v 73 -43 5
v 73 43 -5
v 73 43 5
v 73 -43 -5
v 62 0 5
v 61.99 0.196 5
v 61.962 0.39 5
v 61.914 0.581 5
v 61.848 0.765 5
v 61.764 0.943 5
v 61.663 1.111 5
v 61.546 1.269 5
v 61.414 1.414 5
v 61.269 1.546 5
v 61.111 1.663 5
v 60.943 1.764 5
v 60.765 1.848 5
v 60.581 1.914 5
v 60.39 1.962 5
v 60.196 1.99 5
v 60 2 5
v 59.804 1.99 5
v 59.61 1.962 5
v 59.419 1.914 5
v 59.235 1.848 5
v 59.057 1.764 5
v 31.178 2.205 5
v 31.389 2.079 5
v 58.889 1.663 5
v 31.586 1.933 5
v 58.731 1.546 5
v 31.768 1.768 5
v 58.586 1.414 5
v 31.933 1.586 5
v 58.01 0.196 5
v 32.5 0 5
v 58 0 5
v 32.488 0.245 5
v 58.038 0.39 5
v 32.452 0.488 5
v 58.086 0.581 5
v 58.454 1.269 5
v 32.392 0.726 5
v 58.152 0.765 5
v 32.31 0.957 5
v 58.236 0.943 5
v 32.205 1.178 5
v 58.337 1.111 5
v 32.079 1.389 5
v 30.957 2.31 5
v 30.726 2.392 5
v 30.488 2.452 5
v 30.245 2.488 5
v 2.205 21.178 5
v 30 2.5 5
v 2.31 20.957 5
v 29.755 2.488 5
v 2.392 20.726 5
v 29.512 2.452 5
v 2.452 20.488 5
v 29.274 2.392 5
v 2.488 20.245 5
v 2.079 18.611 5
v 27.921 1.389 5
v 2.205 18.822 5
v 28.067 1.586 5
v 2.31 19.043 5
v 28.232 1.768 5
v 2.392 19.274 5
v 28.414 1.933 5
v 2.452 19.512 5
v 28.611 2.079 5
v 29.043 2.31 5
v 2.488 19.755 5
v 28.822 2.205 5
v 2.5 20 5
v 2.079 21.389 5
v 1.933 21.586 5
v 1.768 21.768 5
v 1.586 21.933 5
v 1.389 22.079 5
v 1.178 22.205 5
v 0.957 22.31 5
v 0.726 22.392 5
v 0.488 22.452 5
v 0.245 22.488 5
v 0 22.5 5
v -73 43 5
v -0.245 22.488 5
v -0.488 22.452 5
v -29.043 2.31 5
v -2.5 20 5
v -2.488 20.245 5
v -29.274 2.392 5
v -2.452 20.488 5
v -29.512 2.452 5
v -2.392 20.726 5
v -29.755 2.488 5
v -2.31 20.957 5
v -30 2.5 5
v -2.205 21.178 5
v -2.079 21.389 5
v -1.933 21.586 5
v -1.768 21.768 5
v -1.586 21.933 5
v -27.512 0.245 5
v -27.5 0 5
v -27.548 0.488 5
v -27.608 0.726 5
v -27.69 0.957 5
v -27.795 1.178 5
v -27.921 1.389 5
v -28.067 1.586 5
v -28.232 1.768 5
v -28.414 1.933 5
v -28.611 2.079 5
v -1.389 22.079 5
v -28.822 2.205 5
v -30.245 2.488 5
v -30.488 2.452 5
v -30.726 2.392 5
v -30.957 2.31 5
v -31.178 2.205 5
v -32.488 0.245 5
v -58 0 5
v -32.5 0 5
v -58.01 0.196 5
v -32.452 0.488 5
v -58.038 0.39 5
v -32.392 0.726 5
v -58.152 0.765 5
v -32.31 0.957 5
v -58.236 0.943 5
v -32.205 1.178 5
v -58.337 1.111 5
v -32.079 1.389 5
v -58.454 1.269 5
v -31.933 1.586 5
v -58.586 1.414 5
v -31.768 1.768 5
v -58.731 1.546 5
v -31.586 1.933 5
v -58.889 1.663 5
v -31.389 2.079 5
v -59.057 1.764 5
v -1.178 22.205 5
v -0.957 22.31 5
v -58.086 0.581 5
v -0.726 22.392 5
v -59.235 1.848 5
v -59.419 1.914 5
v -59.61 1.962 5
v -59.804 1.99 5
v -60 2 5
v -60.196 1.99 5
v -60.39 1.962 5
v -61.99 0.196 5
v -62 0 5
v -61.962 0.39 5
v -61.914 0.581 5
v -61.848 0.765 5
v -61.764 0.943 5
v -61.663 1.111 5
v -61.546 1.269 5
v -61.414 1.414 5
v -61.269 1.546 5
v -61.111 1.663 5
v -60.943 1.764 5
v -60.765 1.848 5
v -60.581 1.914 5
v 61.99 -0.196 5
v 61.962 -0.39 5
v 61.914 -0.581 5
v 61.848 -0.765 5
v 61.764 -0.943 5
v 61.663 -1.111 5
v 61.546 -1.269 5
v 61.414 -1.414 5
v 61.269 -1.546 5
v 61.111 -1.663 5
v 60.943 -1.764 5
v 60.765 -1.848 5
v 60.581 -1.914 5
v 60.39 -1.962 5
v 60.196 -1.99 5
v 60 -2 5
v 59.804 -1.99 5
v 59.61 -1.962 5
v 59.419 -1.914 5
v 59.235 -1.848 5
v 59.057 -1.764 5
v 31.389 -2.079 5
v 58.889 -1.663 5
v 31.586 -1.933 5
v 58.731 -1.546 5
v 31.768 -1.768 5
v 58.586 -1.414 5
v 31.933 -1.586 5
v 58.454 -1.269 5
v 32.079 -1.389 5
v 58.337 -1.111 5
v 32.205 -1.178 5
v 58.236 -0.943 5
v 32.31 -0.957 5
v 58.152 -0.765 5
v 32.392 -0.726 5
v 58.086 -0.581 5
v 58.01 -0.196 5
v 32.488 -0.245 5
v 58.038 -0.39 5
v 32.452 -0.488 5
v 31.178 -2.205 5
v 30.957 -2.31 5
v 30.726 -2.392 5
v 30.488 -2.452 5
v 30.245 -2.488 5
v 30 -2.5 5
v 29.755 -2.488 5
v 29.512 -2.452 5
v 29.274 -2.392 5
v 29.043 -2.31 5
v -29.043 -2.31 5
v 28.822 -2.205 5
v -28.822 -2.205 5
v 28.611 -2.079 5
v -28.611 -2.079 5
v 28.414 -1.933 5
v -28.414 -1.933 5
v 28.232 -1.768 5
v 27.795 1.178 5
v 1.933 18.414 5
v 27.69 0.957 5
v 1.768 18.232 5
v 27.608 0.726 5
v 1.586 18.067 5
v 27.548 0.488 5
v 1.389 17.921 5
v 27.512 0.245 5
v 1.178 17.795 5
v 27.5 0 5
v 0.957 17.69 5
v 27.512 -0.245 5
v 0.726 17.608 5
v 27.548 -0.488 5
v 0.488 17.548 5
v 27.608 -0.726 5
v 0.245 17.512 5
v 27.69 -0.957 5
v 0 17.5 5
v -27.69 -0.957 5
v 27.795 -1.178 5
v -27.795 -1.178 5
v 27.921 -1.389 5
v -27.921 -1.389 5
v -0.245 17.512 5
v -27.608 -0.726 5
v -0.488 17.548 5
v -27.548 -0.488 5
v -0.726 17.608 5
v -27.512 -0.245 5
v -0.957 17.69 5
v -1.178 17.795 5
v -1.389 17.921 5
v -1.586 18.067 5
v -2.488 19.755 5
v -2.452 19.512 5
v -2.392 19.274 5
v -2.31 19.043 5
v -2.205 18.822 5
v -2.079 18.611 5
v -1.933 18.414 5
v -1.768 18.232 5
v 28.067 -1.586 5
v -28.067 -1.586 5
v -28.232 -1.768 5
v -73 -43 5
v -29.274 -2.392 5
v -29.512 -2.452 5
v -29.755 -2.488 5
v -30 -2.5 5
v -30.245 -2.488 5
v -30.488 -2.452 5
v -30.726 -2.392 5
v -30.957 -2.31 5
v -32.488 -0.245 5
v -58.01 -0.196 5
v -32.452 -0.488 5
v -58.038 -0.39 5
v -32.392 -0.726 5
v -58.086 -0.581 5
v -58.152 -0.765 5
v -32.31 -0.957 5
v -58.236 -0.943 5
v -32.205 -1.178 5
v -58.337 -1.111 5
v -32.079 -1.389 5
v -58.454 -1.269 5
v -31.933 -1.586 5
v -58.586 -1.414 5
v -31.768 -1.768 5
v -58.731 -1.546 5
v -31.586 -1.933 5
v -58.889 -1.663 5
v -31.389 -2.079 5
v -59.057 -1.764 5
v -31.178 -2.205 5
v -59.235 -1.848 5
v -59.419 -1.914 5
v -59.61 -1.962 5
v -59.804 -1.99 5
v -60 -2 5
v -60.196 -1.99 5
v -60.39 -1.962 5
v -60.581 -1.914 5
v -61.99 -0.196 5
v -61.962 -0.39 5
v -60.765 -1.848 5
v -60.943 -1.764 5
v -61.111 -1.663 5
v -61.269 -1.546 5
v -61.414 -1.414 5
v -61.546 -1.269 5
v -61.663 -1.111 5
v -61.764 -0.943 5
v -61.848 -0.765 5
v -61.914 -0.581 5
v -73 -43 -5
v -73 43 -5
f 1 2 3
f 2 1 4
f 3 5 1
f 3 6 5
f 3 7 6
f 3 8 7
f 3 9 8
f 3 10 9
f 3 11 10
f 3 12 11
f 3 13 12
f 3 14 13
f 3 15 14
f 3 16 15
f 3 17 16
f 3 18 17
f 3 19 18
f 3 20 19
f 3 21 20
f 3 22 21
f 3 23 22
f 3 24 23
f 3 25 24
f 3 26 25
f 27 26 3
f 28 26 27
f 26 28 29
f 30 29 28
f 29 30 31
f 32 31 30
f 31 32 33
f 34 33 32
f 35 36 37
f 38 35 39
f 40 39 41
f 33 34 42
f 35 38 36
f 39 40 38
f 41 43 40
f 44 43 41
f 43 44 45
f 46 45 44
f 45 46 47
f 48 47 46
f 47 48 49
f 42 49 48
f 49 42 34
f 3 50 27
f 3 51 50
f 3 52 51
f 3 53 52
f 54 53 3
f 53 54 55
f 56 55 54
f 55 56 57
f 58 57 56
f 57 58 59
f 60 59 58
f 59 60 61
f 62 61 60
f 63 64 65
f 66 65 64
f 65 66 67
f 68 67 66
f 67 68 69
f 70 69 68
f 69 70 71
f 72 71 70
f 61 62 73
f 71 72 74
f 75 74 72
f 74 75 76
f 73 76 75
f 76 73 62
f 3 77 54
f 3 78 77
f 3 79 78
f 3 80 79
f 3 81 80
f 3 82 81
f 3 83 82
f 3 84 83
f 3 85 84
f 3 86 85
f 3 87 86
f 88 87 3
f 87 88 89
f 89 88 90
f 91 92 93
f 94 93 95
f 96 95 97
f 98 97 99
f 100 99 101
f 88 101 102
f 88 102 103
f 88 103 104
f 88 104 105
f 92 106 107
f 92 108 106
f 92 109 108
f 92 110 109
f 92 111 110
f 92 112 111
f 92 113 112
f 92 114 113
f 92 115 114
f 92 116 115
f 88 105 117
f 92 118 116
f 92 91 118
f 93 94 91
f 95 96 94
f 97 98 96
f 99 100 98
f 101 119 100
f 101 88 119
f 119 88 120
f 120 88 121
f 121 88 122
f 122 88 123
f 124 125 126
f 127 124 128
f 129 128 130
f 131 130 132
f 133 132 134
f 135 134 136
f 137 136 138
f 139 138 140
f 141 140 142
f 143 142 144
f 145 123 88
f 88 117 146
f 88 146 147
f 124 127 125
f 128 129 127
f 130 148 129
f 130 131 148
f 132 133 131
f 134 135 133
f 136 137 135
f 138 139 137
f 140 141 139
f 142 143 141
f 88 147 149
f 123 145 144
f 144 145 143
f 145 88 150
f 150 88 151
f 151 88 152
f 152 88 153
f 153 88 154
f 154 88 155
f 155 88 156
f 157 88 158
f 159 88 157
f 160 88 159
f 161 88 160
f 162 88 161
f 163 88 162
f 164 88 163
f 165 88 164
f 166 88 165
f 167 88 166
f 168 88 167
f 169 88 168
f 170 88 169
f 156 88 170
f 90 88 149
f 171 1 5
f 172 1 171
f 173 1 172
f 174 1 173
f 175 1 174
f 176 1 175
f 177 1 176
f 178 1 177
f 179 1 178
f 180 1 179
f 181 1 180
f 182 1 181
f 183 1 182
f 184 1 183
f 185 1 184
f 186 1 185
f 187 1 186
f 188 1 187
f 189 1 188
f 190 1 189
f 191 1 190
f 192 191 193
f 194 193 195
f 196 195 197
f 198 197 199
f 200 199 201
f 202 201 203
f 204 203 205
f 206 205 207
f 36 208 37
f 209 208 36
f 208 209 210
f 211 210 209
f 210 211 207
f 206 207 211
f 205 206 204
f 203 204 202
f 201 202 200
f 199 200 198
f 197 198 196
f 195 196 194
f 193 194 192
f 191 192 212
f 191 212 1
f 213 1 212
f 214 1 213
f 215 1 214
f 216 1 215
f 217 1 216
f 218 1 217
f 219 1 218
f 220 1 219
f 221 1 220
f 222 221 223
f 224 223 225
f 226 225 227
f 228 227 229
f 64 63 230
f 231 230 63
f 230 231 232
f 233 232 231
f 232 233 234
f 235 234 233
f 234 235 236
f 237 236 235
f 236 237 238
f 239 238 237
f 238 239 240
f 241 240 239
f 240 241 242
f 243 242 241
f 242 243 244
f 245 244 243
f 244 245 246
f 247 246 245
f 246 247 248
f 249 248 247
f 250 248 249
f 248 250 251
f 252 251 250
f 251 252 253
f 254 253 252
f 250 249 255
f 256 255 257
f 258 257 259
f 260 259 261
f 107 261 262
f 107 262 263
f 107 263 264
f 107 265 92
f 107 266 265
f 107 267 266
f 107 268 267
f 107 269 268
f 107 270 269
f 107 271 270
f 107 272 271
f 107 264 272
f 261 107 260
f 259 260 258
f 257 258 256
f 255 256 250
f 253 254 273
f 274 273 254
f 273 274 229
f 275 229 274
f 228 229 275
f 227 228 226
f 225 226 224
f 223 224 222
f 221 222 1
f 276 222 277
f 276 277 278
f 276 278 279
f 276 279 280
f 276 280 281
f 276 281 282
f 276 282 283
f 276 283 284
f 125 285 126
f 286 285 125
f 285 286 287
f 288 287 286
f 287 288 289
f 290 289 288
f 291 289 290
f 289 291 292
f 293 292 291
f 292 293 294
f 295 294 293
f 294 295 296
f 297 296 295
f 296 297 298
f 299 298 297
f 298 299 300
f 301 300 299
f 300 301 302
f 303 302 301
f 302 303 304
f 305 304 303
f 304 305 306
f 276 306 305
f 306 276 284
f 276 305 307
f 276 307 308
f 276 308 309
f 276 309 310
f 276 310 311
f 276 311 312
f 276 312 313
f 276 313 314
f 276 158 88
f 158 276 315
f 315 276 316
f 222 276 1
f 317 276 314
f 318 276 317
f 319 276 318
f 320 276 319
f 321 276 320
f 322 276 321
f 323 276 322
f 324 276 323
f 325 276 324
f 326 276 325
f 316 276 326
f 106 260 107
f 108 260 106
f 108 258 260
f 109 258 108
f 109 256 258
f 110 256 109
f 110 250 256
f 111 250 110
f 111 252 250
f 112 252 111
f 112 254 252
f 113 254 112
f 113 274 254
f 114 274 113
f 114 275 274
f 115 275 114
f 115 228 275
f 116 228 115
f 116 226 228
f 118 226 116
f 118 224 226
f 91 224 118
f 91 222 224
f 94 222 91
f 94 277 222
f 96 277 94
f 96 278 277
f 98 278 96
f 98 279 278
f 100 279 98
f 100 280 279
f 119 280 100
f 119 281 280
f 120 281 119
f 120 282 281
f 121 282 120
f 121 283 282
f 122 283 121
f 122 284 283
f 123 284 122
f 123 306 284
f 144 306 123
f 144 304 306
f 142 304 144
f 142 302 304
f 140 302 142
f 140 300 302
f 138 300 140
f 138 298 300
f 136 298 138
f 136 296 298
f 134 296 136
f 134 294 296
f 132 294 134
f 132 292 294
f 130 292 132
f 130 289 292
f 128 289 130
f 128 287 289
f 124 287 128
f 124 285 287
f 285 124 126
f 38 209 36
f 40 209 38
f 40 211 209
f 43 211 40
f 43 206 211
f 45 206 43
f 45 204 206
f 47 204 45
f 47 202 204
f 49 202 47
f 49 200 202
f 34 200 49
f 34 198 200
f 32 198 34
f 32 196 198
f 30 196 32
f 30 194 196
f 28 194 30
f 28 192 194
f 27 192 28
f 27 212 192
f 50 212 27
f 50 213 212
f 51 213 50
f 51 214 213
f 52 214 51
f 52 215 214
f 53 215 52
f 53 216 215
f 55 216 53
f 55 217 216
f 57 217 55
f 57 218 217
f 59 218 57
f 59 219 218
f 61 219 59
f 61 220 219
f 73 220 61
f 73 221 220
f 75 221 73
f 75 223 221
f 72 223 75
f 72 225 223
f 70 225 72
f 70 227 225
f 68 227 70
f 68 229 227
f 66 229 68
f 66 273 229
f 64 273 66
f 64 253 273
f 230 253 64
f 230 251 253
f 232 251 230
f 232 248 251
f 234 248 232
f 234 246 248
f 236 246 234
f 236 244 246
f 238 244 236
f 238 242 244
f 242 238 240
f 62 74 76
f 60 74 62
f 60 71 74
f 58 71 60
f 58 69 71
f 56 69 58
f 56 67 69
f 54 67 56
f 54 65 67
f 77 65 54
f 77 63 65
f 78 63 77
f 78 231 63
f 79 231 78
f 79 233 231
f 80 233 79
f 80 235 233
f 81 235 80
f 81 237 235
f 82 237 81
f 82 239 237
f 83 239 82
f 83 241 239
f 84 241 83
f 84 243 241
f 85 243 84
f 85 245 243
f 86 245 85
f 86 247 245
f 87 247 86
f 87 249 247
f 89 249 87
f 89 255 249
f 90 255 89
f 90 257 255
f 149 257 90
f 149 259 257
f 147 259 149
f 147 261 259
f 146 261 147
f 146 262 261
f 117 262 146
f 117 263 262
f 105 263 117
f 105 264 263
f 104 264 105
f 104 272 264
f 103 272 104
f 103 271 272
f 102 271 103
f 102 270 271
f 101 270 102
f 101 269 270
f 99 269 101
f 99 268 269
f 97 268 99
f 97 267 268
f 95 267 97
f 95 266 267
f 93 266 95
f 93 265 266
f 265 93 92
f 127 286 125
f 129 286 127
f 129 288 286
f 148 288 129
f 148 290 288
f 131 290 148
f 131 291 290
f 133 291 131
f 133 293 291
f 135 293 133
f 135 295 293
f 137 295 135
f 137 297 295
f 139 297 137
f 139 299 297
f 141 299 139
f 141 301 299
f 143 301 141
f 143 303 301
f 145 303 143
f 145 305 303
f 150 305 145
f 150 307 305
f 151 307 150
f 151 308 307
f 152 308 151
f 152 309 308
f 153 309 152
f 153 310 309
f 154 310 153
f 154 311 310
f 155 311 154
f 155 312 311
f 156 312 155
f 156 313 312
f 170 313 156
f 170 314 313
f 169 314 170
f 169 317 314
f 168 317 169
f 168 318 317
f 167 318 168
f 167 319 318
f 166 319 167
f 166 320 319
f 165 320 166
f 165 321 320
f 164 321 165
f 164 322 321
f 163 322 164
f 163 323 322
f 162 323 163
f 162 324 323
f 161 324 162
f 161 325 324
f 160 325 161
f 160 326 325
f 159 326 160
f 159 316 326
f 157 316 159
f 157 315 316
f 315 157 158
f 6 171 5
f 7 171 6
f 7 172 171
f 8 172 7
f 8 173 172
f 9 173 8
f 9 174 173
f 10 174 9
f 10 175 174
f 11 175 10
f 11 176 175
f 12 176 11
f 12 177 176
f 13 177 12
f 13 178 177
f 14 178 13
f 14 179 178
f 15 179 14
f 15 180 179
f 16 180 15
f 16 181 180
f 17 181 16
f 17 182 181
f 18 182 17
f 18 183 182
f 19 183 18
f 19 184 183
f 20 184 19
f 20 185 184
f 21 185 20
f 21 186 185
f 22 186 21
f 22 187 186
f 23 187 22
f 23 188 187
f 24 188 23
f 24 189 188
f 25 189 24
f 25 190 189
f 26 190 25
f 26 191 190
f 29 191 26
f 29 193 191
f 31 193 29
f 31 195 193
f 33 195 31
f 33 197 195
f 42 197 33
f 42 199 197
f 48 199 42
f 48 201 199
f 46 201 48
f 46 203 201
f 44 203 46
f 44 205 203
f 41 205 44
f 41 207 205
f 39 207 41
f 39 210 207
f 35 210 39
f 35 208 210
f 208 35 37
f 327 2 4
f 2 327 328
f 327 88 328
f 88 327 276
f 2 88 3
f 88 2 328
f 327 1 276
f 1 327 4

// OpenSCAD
module mains_socket() {
    difference() {
        // Main body of the socket
        cube([146, 86, 10], center = true);
        
        // Cutouts for the plug holes
        translate([-30, 0, 5])
            cylinder(h = 10, d = 5, $fn = 64);
        translate([30, 0, 5])
            cylinder(h = 10, d = 5, $fn = 64);
        translate([0, 20, 5])
            cylinder(h = 10, d = 5, $fn = 64);
        
        // Cutout for the screw holes
        translate([-60, 0, 5])
            cylinder(h = 10, d = 4, $fn = 64);
        translate([60, 0, 5])
            cylinder(h = 10, d = 4, $fn = 64);
    }
}

mains_socket();
